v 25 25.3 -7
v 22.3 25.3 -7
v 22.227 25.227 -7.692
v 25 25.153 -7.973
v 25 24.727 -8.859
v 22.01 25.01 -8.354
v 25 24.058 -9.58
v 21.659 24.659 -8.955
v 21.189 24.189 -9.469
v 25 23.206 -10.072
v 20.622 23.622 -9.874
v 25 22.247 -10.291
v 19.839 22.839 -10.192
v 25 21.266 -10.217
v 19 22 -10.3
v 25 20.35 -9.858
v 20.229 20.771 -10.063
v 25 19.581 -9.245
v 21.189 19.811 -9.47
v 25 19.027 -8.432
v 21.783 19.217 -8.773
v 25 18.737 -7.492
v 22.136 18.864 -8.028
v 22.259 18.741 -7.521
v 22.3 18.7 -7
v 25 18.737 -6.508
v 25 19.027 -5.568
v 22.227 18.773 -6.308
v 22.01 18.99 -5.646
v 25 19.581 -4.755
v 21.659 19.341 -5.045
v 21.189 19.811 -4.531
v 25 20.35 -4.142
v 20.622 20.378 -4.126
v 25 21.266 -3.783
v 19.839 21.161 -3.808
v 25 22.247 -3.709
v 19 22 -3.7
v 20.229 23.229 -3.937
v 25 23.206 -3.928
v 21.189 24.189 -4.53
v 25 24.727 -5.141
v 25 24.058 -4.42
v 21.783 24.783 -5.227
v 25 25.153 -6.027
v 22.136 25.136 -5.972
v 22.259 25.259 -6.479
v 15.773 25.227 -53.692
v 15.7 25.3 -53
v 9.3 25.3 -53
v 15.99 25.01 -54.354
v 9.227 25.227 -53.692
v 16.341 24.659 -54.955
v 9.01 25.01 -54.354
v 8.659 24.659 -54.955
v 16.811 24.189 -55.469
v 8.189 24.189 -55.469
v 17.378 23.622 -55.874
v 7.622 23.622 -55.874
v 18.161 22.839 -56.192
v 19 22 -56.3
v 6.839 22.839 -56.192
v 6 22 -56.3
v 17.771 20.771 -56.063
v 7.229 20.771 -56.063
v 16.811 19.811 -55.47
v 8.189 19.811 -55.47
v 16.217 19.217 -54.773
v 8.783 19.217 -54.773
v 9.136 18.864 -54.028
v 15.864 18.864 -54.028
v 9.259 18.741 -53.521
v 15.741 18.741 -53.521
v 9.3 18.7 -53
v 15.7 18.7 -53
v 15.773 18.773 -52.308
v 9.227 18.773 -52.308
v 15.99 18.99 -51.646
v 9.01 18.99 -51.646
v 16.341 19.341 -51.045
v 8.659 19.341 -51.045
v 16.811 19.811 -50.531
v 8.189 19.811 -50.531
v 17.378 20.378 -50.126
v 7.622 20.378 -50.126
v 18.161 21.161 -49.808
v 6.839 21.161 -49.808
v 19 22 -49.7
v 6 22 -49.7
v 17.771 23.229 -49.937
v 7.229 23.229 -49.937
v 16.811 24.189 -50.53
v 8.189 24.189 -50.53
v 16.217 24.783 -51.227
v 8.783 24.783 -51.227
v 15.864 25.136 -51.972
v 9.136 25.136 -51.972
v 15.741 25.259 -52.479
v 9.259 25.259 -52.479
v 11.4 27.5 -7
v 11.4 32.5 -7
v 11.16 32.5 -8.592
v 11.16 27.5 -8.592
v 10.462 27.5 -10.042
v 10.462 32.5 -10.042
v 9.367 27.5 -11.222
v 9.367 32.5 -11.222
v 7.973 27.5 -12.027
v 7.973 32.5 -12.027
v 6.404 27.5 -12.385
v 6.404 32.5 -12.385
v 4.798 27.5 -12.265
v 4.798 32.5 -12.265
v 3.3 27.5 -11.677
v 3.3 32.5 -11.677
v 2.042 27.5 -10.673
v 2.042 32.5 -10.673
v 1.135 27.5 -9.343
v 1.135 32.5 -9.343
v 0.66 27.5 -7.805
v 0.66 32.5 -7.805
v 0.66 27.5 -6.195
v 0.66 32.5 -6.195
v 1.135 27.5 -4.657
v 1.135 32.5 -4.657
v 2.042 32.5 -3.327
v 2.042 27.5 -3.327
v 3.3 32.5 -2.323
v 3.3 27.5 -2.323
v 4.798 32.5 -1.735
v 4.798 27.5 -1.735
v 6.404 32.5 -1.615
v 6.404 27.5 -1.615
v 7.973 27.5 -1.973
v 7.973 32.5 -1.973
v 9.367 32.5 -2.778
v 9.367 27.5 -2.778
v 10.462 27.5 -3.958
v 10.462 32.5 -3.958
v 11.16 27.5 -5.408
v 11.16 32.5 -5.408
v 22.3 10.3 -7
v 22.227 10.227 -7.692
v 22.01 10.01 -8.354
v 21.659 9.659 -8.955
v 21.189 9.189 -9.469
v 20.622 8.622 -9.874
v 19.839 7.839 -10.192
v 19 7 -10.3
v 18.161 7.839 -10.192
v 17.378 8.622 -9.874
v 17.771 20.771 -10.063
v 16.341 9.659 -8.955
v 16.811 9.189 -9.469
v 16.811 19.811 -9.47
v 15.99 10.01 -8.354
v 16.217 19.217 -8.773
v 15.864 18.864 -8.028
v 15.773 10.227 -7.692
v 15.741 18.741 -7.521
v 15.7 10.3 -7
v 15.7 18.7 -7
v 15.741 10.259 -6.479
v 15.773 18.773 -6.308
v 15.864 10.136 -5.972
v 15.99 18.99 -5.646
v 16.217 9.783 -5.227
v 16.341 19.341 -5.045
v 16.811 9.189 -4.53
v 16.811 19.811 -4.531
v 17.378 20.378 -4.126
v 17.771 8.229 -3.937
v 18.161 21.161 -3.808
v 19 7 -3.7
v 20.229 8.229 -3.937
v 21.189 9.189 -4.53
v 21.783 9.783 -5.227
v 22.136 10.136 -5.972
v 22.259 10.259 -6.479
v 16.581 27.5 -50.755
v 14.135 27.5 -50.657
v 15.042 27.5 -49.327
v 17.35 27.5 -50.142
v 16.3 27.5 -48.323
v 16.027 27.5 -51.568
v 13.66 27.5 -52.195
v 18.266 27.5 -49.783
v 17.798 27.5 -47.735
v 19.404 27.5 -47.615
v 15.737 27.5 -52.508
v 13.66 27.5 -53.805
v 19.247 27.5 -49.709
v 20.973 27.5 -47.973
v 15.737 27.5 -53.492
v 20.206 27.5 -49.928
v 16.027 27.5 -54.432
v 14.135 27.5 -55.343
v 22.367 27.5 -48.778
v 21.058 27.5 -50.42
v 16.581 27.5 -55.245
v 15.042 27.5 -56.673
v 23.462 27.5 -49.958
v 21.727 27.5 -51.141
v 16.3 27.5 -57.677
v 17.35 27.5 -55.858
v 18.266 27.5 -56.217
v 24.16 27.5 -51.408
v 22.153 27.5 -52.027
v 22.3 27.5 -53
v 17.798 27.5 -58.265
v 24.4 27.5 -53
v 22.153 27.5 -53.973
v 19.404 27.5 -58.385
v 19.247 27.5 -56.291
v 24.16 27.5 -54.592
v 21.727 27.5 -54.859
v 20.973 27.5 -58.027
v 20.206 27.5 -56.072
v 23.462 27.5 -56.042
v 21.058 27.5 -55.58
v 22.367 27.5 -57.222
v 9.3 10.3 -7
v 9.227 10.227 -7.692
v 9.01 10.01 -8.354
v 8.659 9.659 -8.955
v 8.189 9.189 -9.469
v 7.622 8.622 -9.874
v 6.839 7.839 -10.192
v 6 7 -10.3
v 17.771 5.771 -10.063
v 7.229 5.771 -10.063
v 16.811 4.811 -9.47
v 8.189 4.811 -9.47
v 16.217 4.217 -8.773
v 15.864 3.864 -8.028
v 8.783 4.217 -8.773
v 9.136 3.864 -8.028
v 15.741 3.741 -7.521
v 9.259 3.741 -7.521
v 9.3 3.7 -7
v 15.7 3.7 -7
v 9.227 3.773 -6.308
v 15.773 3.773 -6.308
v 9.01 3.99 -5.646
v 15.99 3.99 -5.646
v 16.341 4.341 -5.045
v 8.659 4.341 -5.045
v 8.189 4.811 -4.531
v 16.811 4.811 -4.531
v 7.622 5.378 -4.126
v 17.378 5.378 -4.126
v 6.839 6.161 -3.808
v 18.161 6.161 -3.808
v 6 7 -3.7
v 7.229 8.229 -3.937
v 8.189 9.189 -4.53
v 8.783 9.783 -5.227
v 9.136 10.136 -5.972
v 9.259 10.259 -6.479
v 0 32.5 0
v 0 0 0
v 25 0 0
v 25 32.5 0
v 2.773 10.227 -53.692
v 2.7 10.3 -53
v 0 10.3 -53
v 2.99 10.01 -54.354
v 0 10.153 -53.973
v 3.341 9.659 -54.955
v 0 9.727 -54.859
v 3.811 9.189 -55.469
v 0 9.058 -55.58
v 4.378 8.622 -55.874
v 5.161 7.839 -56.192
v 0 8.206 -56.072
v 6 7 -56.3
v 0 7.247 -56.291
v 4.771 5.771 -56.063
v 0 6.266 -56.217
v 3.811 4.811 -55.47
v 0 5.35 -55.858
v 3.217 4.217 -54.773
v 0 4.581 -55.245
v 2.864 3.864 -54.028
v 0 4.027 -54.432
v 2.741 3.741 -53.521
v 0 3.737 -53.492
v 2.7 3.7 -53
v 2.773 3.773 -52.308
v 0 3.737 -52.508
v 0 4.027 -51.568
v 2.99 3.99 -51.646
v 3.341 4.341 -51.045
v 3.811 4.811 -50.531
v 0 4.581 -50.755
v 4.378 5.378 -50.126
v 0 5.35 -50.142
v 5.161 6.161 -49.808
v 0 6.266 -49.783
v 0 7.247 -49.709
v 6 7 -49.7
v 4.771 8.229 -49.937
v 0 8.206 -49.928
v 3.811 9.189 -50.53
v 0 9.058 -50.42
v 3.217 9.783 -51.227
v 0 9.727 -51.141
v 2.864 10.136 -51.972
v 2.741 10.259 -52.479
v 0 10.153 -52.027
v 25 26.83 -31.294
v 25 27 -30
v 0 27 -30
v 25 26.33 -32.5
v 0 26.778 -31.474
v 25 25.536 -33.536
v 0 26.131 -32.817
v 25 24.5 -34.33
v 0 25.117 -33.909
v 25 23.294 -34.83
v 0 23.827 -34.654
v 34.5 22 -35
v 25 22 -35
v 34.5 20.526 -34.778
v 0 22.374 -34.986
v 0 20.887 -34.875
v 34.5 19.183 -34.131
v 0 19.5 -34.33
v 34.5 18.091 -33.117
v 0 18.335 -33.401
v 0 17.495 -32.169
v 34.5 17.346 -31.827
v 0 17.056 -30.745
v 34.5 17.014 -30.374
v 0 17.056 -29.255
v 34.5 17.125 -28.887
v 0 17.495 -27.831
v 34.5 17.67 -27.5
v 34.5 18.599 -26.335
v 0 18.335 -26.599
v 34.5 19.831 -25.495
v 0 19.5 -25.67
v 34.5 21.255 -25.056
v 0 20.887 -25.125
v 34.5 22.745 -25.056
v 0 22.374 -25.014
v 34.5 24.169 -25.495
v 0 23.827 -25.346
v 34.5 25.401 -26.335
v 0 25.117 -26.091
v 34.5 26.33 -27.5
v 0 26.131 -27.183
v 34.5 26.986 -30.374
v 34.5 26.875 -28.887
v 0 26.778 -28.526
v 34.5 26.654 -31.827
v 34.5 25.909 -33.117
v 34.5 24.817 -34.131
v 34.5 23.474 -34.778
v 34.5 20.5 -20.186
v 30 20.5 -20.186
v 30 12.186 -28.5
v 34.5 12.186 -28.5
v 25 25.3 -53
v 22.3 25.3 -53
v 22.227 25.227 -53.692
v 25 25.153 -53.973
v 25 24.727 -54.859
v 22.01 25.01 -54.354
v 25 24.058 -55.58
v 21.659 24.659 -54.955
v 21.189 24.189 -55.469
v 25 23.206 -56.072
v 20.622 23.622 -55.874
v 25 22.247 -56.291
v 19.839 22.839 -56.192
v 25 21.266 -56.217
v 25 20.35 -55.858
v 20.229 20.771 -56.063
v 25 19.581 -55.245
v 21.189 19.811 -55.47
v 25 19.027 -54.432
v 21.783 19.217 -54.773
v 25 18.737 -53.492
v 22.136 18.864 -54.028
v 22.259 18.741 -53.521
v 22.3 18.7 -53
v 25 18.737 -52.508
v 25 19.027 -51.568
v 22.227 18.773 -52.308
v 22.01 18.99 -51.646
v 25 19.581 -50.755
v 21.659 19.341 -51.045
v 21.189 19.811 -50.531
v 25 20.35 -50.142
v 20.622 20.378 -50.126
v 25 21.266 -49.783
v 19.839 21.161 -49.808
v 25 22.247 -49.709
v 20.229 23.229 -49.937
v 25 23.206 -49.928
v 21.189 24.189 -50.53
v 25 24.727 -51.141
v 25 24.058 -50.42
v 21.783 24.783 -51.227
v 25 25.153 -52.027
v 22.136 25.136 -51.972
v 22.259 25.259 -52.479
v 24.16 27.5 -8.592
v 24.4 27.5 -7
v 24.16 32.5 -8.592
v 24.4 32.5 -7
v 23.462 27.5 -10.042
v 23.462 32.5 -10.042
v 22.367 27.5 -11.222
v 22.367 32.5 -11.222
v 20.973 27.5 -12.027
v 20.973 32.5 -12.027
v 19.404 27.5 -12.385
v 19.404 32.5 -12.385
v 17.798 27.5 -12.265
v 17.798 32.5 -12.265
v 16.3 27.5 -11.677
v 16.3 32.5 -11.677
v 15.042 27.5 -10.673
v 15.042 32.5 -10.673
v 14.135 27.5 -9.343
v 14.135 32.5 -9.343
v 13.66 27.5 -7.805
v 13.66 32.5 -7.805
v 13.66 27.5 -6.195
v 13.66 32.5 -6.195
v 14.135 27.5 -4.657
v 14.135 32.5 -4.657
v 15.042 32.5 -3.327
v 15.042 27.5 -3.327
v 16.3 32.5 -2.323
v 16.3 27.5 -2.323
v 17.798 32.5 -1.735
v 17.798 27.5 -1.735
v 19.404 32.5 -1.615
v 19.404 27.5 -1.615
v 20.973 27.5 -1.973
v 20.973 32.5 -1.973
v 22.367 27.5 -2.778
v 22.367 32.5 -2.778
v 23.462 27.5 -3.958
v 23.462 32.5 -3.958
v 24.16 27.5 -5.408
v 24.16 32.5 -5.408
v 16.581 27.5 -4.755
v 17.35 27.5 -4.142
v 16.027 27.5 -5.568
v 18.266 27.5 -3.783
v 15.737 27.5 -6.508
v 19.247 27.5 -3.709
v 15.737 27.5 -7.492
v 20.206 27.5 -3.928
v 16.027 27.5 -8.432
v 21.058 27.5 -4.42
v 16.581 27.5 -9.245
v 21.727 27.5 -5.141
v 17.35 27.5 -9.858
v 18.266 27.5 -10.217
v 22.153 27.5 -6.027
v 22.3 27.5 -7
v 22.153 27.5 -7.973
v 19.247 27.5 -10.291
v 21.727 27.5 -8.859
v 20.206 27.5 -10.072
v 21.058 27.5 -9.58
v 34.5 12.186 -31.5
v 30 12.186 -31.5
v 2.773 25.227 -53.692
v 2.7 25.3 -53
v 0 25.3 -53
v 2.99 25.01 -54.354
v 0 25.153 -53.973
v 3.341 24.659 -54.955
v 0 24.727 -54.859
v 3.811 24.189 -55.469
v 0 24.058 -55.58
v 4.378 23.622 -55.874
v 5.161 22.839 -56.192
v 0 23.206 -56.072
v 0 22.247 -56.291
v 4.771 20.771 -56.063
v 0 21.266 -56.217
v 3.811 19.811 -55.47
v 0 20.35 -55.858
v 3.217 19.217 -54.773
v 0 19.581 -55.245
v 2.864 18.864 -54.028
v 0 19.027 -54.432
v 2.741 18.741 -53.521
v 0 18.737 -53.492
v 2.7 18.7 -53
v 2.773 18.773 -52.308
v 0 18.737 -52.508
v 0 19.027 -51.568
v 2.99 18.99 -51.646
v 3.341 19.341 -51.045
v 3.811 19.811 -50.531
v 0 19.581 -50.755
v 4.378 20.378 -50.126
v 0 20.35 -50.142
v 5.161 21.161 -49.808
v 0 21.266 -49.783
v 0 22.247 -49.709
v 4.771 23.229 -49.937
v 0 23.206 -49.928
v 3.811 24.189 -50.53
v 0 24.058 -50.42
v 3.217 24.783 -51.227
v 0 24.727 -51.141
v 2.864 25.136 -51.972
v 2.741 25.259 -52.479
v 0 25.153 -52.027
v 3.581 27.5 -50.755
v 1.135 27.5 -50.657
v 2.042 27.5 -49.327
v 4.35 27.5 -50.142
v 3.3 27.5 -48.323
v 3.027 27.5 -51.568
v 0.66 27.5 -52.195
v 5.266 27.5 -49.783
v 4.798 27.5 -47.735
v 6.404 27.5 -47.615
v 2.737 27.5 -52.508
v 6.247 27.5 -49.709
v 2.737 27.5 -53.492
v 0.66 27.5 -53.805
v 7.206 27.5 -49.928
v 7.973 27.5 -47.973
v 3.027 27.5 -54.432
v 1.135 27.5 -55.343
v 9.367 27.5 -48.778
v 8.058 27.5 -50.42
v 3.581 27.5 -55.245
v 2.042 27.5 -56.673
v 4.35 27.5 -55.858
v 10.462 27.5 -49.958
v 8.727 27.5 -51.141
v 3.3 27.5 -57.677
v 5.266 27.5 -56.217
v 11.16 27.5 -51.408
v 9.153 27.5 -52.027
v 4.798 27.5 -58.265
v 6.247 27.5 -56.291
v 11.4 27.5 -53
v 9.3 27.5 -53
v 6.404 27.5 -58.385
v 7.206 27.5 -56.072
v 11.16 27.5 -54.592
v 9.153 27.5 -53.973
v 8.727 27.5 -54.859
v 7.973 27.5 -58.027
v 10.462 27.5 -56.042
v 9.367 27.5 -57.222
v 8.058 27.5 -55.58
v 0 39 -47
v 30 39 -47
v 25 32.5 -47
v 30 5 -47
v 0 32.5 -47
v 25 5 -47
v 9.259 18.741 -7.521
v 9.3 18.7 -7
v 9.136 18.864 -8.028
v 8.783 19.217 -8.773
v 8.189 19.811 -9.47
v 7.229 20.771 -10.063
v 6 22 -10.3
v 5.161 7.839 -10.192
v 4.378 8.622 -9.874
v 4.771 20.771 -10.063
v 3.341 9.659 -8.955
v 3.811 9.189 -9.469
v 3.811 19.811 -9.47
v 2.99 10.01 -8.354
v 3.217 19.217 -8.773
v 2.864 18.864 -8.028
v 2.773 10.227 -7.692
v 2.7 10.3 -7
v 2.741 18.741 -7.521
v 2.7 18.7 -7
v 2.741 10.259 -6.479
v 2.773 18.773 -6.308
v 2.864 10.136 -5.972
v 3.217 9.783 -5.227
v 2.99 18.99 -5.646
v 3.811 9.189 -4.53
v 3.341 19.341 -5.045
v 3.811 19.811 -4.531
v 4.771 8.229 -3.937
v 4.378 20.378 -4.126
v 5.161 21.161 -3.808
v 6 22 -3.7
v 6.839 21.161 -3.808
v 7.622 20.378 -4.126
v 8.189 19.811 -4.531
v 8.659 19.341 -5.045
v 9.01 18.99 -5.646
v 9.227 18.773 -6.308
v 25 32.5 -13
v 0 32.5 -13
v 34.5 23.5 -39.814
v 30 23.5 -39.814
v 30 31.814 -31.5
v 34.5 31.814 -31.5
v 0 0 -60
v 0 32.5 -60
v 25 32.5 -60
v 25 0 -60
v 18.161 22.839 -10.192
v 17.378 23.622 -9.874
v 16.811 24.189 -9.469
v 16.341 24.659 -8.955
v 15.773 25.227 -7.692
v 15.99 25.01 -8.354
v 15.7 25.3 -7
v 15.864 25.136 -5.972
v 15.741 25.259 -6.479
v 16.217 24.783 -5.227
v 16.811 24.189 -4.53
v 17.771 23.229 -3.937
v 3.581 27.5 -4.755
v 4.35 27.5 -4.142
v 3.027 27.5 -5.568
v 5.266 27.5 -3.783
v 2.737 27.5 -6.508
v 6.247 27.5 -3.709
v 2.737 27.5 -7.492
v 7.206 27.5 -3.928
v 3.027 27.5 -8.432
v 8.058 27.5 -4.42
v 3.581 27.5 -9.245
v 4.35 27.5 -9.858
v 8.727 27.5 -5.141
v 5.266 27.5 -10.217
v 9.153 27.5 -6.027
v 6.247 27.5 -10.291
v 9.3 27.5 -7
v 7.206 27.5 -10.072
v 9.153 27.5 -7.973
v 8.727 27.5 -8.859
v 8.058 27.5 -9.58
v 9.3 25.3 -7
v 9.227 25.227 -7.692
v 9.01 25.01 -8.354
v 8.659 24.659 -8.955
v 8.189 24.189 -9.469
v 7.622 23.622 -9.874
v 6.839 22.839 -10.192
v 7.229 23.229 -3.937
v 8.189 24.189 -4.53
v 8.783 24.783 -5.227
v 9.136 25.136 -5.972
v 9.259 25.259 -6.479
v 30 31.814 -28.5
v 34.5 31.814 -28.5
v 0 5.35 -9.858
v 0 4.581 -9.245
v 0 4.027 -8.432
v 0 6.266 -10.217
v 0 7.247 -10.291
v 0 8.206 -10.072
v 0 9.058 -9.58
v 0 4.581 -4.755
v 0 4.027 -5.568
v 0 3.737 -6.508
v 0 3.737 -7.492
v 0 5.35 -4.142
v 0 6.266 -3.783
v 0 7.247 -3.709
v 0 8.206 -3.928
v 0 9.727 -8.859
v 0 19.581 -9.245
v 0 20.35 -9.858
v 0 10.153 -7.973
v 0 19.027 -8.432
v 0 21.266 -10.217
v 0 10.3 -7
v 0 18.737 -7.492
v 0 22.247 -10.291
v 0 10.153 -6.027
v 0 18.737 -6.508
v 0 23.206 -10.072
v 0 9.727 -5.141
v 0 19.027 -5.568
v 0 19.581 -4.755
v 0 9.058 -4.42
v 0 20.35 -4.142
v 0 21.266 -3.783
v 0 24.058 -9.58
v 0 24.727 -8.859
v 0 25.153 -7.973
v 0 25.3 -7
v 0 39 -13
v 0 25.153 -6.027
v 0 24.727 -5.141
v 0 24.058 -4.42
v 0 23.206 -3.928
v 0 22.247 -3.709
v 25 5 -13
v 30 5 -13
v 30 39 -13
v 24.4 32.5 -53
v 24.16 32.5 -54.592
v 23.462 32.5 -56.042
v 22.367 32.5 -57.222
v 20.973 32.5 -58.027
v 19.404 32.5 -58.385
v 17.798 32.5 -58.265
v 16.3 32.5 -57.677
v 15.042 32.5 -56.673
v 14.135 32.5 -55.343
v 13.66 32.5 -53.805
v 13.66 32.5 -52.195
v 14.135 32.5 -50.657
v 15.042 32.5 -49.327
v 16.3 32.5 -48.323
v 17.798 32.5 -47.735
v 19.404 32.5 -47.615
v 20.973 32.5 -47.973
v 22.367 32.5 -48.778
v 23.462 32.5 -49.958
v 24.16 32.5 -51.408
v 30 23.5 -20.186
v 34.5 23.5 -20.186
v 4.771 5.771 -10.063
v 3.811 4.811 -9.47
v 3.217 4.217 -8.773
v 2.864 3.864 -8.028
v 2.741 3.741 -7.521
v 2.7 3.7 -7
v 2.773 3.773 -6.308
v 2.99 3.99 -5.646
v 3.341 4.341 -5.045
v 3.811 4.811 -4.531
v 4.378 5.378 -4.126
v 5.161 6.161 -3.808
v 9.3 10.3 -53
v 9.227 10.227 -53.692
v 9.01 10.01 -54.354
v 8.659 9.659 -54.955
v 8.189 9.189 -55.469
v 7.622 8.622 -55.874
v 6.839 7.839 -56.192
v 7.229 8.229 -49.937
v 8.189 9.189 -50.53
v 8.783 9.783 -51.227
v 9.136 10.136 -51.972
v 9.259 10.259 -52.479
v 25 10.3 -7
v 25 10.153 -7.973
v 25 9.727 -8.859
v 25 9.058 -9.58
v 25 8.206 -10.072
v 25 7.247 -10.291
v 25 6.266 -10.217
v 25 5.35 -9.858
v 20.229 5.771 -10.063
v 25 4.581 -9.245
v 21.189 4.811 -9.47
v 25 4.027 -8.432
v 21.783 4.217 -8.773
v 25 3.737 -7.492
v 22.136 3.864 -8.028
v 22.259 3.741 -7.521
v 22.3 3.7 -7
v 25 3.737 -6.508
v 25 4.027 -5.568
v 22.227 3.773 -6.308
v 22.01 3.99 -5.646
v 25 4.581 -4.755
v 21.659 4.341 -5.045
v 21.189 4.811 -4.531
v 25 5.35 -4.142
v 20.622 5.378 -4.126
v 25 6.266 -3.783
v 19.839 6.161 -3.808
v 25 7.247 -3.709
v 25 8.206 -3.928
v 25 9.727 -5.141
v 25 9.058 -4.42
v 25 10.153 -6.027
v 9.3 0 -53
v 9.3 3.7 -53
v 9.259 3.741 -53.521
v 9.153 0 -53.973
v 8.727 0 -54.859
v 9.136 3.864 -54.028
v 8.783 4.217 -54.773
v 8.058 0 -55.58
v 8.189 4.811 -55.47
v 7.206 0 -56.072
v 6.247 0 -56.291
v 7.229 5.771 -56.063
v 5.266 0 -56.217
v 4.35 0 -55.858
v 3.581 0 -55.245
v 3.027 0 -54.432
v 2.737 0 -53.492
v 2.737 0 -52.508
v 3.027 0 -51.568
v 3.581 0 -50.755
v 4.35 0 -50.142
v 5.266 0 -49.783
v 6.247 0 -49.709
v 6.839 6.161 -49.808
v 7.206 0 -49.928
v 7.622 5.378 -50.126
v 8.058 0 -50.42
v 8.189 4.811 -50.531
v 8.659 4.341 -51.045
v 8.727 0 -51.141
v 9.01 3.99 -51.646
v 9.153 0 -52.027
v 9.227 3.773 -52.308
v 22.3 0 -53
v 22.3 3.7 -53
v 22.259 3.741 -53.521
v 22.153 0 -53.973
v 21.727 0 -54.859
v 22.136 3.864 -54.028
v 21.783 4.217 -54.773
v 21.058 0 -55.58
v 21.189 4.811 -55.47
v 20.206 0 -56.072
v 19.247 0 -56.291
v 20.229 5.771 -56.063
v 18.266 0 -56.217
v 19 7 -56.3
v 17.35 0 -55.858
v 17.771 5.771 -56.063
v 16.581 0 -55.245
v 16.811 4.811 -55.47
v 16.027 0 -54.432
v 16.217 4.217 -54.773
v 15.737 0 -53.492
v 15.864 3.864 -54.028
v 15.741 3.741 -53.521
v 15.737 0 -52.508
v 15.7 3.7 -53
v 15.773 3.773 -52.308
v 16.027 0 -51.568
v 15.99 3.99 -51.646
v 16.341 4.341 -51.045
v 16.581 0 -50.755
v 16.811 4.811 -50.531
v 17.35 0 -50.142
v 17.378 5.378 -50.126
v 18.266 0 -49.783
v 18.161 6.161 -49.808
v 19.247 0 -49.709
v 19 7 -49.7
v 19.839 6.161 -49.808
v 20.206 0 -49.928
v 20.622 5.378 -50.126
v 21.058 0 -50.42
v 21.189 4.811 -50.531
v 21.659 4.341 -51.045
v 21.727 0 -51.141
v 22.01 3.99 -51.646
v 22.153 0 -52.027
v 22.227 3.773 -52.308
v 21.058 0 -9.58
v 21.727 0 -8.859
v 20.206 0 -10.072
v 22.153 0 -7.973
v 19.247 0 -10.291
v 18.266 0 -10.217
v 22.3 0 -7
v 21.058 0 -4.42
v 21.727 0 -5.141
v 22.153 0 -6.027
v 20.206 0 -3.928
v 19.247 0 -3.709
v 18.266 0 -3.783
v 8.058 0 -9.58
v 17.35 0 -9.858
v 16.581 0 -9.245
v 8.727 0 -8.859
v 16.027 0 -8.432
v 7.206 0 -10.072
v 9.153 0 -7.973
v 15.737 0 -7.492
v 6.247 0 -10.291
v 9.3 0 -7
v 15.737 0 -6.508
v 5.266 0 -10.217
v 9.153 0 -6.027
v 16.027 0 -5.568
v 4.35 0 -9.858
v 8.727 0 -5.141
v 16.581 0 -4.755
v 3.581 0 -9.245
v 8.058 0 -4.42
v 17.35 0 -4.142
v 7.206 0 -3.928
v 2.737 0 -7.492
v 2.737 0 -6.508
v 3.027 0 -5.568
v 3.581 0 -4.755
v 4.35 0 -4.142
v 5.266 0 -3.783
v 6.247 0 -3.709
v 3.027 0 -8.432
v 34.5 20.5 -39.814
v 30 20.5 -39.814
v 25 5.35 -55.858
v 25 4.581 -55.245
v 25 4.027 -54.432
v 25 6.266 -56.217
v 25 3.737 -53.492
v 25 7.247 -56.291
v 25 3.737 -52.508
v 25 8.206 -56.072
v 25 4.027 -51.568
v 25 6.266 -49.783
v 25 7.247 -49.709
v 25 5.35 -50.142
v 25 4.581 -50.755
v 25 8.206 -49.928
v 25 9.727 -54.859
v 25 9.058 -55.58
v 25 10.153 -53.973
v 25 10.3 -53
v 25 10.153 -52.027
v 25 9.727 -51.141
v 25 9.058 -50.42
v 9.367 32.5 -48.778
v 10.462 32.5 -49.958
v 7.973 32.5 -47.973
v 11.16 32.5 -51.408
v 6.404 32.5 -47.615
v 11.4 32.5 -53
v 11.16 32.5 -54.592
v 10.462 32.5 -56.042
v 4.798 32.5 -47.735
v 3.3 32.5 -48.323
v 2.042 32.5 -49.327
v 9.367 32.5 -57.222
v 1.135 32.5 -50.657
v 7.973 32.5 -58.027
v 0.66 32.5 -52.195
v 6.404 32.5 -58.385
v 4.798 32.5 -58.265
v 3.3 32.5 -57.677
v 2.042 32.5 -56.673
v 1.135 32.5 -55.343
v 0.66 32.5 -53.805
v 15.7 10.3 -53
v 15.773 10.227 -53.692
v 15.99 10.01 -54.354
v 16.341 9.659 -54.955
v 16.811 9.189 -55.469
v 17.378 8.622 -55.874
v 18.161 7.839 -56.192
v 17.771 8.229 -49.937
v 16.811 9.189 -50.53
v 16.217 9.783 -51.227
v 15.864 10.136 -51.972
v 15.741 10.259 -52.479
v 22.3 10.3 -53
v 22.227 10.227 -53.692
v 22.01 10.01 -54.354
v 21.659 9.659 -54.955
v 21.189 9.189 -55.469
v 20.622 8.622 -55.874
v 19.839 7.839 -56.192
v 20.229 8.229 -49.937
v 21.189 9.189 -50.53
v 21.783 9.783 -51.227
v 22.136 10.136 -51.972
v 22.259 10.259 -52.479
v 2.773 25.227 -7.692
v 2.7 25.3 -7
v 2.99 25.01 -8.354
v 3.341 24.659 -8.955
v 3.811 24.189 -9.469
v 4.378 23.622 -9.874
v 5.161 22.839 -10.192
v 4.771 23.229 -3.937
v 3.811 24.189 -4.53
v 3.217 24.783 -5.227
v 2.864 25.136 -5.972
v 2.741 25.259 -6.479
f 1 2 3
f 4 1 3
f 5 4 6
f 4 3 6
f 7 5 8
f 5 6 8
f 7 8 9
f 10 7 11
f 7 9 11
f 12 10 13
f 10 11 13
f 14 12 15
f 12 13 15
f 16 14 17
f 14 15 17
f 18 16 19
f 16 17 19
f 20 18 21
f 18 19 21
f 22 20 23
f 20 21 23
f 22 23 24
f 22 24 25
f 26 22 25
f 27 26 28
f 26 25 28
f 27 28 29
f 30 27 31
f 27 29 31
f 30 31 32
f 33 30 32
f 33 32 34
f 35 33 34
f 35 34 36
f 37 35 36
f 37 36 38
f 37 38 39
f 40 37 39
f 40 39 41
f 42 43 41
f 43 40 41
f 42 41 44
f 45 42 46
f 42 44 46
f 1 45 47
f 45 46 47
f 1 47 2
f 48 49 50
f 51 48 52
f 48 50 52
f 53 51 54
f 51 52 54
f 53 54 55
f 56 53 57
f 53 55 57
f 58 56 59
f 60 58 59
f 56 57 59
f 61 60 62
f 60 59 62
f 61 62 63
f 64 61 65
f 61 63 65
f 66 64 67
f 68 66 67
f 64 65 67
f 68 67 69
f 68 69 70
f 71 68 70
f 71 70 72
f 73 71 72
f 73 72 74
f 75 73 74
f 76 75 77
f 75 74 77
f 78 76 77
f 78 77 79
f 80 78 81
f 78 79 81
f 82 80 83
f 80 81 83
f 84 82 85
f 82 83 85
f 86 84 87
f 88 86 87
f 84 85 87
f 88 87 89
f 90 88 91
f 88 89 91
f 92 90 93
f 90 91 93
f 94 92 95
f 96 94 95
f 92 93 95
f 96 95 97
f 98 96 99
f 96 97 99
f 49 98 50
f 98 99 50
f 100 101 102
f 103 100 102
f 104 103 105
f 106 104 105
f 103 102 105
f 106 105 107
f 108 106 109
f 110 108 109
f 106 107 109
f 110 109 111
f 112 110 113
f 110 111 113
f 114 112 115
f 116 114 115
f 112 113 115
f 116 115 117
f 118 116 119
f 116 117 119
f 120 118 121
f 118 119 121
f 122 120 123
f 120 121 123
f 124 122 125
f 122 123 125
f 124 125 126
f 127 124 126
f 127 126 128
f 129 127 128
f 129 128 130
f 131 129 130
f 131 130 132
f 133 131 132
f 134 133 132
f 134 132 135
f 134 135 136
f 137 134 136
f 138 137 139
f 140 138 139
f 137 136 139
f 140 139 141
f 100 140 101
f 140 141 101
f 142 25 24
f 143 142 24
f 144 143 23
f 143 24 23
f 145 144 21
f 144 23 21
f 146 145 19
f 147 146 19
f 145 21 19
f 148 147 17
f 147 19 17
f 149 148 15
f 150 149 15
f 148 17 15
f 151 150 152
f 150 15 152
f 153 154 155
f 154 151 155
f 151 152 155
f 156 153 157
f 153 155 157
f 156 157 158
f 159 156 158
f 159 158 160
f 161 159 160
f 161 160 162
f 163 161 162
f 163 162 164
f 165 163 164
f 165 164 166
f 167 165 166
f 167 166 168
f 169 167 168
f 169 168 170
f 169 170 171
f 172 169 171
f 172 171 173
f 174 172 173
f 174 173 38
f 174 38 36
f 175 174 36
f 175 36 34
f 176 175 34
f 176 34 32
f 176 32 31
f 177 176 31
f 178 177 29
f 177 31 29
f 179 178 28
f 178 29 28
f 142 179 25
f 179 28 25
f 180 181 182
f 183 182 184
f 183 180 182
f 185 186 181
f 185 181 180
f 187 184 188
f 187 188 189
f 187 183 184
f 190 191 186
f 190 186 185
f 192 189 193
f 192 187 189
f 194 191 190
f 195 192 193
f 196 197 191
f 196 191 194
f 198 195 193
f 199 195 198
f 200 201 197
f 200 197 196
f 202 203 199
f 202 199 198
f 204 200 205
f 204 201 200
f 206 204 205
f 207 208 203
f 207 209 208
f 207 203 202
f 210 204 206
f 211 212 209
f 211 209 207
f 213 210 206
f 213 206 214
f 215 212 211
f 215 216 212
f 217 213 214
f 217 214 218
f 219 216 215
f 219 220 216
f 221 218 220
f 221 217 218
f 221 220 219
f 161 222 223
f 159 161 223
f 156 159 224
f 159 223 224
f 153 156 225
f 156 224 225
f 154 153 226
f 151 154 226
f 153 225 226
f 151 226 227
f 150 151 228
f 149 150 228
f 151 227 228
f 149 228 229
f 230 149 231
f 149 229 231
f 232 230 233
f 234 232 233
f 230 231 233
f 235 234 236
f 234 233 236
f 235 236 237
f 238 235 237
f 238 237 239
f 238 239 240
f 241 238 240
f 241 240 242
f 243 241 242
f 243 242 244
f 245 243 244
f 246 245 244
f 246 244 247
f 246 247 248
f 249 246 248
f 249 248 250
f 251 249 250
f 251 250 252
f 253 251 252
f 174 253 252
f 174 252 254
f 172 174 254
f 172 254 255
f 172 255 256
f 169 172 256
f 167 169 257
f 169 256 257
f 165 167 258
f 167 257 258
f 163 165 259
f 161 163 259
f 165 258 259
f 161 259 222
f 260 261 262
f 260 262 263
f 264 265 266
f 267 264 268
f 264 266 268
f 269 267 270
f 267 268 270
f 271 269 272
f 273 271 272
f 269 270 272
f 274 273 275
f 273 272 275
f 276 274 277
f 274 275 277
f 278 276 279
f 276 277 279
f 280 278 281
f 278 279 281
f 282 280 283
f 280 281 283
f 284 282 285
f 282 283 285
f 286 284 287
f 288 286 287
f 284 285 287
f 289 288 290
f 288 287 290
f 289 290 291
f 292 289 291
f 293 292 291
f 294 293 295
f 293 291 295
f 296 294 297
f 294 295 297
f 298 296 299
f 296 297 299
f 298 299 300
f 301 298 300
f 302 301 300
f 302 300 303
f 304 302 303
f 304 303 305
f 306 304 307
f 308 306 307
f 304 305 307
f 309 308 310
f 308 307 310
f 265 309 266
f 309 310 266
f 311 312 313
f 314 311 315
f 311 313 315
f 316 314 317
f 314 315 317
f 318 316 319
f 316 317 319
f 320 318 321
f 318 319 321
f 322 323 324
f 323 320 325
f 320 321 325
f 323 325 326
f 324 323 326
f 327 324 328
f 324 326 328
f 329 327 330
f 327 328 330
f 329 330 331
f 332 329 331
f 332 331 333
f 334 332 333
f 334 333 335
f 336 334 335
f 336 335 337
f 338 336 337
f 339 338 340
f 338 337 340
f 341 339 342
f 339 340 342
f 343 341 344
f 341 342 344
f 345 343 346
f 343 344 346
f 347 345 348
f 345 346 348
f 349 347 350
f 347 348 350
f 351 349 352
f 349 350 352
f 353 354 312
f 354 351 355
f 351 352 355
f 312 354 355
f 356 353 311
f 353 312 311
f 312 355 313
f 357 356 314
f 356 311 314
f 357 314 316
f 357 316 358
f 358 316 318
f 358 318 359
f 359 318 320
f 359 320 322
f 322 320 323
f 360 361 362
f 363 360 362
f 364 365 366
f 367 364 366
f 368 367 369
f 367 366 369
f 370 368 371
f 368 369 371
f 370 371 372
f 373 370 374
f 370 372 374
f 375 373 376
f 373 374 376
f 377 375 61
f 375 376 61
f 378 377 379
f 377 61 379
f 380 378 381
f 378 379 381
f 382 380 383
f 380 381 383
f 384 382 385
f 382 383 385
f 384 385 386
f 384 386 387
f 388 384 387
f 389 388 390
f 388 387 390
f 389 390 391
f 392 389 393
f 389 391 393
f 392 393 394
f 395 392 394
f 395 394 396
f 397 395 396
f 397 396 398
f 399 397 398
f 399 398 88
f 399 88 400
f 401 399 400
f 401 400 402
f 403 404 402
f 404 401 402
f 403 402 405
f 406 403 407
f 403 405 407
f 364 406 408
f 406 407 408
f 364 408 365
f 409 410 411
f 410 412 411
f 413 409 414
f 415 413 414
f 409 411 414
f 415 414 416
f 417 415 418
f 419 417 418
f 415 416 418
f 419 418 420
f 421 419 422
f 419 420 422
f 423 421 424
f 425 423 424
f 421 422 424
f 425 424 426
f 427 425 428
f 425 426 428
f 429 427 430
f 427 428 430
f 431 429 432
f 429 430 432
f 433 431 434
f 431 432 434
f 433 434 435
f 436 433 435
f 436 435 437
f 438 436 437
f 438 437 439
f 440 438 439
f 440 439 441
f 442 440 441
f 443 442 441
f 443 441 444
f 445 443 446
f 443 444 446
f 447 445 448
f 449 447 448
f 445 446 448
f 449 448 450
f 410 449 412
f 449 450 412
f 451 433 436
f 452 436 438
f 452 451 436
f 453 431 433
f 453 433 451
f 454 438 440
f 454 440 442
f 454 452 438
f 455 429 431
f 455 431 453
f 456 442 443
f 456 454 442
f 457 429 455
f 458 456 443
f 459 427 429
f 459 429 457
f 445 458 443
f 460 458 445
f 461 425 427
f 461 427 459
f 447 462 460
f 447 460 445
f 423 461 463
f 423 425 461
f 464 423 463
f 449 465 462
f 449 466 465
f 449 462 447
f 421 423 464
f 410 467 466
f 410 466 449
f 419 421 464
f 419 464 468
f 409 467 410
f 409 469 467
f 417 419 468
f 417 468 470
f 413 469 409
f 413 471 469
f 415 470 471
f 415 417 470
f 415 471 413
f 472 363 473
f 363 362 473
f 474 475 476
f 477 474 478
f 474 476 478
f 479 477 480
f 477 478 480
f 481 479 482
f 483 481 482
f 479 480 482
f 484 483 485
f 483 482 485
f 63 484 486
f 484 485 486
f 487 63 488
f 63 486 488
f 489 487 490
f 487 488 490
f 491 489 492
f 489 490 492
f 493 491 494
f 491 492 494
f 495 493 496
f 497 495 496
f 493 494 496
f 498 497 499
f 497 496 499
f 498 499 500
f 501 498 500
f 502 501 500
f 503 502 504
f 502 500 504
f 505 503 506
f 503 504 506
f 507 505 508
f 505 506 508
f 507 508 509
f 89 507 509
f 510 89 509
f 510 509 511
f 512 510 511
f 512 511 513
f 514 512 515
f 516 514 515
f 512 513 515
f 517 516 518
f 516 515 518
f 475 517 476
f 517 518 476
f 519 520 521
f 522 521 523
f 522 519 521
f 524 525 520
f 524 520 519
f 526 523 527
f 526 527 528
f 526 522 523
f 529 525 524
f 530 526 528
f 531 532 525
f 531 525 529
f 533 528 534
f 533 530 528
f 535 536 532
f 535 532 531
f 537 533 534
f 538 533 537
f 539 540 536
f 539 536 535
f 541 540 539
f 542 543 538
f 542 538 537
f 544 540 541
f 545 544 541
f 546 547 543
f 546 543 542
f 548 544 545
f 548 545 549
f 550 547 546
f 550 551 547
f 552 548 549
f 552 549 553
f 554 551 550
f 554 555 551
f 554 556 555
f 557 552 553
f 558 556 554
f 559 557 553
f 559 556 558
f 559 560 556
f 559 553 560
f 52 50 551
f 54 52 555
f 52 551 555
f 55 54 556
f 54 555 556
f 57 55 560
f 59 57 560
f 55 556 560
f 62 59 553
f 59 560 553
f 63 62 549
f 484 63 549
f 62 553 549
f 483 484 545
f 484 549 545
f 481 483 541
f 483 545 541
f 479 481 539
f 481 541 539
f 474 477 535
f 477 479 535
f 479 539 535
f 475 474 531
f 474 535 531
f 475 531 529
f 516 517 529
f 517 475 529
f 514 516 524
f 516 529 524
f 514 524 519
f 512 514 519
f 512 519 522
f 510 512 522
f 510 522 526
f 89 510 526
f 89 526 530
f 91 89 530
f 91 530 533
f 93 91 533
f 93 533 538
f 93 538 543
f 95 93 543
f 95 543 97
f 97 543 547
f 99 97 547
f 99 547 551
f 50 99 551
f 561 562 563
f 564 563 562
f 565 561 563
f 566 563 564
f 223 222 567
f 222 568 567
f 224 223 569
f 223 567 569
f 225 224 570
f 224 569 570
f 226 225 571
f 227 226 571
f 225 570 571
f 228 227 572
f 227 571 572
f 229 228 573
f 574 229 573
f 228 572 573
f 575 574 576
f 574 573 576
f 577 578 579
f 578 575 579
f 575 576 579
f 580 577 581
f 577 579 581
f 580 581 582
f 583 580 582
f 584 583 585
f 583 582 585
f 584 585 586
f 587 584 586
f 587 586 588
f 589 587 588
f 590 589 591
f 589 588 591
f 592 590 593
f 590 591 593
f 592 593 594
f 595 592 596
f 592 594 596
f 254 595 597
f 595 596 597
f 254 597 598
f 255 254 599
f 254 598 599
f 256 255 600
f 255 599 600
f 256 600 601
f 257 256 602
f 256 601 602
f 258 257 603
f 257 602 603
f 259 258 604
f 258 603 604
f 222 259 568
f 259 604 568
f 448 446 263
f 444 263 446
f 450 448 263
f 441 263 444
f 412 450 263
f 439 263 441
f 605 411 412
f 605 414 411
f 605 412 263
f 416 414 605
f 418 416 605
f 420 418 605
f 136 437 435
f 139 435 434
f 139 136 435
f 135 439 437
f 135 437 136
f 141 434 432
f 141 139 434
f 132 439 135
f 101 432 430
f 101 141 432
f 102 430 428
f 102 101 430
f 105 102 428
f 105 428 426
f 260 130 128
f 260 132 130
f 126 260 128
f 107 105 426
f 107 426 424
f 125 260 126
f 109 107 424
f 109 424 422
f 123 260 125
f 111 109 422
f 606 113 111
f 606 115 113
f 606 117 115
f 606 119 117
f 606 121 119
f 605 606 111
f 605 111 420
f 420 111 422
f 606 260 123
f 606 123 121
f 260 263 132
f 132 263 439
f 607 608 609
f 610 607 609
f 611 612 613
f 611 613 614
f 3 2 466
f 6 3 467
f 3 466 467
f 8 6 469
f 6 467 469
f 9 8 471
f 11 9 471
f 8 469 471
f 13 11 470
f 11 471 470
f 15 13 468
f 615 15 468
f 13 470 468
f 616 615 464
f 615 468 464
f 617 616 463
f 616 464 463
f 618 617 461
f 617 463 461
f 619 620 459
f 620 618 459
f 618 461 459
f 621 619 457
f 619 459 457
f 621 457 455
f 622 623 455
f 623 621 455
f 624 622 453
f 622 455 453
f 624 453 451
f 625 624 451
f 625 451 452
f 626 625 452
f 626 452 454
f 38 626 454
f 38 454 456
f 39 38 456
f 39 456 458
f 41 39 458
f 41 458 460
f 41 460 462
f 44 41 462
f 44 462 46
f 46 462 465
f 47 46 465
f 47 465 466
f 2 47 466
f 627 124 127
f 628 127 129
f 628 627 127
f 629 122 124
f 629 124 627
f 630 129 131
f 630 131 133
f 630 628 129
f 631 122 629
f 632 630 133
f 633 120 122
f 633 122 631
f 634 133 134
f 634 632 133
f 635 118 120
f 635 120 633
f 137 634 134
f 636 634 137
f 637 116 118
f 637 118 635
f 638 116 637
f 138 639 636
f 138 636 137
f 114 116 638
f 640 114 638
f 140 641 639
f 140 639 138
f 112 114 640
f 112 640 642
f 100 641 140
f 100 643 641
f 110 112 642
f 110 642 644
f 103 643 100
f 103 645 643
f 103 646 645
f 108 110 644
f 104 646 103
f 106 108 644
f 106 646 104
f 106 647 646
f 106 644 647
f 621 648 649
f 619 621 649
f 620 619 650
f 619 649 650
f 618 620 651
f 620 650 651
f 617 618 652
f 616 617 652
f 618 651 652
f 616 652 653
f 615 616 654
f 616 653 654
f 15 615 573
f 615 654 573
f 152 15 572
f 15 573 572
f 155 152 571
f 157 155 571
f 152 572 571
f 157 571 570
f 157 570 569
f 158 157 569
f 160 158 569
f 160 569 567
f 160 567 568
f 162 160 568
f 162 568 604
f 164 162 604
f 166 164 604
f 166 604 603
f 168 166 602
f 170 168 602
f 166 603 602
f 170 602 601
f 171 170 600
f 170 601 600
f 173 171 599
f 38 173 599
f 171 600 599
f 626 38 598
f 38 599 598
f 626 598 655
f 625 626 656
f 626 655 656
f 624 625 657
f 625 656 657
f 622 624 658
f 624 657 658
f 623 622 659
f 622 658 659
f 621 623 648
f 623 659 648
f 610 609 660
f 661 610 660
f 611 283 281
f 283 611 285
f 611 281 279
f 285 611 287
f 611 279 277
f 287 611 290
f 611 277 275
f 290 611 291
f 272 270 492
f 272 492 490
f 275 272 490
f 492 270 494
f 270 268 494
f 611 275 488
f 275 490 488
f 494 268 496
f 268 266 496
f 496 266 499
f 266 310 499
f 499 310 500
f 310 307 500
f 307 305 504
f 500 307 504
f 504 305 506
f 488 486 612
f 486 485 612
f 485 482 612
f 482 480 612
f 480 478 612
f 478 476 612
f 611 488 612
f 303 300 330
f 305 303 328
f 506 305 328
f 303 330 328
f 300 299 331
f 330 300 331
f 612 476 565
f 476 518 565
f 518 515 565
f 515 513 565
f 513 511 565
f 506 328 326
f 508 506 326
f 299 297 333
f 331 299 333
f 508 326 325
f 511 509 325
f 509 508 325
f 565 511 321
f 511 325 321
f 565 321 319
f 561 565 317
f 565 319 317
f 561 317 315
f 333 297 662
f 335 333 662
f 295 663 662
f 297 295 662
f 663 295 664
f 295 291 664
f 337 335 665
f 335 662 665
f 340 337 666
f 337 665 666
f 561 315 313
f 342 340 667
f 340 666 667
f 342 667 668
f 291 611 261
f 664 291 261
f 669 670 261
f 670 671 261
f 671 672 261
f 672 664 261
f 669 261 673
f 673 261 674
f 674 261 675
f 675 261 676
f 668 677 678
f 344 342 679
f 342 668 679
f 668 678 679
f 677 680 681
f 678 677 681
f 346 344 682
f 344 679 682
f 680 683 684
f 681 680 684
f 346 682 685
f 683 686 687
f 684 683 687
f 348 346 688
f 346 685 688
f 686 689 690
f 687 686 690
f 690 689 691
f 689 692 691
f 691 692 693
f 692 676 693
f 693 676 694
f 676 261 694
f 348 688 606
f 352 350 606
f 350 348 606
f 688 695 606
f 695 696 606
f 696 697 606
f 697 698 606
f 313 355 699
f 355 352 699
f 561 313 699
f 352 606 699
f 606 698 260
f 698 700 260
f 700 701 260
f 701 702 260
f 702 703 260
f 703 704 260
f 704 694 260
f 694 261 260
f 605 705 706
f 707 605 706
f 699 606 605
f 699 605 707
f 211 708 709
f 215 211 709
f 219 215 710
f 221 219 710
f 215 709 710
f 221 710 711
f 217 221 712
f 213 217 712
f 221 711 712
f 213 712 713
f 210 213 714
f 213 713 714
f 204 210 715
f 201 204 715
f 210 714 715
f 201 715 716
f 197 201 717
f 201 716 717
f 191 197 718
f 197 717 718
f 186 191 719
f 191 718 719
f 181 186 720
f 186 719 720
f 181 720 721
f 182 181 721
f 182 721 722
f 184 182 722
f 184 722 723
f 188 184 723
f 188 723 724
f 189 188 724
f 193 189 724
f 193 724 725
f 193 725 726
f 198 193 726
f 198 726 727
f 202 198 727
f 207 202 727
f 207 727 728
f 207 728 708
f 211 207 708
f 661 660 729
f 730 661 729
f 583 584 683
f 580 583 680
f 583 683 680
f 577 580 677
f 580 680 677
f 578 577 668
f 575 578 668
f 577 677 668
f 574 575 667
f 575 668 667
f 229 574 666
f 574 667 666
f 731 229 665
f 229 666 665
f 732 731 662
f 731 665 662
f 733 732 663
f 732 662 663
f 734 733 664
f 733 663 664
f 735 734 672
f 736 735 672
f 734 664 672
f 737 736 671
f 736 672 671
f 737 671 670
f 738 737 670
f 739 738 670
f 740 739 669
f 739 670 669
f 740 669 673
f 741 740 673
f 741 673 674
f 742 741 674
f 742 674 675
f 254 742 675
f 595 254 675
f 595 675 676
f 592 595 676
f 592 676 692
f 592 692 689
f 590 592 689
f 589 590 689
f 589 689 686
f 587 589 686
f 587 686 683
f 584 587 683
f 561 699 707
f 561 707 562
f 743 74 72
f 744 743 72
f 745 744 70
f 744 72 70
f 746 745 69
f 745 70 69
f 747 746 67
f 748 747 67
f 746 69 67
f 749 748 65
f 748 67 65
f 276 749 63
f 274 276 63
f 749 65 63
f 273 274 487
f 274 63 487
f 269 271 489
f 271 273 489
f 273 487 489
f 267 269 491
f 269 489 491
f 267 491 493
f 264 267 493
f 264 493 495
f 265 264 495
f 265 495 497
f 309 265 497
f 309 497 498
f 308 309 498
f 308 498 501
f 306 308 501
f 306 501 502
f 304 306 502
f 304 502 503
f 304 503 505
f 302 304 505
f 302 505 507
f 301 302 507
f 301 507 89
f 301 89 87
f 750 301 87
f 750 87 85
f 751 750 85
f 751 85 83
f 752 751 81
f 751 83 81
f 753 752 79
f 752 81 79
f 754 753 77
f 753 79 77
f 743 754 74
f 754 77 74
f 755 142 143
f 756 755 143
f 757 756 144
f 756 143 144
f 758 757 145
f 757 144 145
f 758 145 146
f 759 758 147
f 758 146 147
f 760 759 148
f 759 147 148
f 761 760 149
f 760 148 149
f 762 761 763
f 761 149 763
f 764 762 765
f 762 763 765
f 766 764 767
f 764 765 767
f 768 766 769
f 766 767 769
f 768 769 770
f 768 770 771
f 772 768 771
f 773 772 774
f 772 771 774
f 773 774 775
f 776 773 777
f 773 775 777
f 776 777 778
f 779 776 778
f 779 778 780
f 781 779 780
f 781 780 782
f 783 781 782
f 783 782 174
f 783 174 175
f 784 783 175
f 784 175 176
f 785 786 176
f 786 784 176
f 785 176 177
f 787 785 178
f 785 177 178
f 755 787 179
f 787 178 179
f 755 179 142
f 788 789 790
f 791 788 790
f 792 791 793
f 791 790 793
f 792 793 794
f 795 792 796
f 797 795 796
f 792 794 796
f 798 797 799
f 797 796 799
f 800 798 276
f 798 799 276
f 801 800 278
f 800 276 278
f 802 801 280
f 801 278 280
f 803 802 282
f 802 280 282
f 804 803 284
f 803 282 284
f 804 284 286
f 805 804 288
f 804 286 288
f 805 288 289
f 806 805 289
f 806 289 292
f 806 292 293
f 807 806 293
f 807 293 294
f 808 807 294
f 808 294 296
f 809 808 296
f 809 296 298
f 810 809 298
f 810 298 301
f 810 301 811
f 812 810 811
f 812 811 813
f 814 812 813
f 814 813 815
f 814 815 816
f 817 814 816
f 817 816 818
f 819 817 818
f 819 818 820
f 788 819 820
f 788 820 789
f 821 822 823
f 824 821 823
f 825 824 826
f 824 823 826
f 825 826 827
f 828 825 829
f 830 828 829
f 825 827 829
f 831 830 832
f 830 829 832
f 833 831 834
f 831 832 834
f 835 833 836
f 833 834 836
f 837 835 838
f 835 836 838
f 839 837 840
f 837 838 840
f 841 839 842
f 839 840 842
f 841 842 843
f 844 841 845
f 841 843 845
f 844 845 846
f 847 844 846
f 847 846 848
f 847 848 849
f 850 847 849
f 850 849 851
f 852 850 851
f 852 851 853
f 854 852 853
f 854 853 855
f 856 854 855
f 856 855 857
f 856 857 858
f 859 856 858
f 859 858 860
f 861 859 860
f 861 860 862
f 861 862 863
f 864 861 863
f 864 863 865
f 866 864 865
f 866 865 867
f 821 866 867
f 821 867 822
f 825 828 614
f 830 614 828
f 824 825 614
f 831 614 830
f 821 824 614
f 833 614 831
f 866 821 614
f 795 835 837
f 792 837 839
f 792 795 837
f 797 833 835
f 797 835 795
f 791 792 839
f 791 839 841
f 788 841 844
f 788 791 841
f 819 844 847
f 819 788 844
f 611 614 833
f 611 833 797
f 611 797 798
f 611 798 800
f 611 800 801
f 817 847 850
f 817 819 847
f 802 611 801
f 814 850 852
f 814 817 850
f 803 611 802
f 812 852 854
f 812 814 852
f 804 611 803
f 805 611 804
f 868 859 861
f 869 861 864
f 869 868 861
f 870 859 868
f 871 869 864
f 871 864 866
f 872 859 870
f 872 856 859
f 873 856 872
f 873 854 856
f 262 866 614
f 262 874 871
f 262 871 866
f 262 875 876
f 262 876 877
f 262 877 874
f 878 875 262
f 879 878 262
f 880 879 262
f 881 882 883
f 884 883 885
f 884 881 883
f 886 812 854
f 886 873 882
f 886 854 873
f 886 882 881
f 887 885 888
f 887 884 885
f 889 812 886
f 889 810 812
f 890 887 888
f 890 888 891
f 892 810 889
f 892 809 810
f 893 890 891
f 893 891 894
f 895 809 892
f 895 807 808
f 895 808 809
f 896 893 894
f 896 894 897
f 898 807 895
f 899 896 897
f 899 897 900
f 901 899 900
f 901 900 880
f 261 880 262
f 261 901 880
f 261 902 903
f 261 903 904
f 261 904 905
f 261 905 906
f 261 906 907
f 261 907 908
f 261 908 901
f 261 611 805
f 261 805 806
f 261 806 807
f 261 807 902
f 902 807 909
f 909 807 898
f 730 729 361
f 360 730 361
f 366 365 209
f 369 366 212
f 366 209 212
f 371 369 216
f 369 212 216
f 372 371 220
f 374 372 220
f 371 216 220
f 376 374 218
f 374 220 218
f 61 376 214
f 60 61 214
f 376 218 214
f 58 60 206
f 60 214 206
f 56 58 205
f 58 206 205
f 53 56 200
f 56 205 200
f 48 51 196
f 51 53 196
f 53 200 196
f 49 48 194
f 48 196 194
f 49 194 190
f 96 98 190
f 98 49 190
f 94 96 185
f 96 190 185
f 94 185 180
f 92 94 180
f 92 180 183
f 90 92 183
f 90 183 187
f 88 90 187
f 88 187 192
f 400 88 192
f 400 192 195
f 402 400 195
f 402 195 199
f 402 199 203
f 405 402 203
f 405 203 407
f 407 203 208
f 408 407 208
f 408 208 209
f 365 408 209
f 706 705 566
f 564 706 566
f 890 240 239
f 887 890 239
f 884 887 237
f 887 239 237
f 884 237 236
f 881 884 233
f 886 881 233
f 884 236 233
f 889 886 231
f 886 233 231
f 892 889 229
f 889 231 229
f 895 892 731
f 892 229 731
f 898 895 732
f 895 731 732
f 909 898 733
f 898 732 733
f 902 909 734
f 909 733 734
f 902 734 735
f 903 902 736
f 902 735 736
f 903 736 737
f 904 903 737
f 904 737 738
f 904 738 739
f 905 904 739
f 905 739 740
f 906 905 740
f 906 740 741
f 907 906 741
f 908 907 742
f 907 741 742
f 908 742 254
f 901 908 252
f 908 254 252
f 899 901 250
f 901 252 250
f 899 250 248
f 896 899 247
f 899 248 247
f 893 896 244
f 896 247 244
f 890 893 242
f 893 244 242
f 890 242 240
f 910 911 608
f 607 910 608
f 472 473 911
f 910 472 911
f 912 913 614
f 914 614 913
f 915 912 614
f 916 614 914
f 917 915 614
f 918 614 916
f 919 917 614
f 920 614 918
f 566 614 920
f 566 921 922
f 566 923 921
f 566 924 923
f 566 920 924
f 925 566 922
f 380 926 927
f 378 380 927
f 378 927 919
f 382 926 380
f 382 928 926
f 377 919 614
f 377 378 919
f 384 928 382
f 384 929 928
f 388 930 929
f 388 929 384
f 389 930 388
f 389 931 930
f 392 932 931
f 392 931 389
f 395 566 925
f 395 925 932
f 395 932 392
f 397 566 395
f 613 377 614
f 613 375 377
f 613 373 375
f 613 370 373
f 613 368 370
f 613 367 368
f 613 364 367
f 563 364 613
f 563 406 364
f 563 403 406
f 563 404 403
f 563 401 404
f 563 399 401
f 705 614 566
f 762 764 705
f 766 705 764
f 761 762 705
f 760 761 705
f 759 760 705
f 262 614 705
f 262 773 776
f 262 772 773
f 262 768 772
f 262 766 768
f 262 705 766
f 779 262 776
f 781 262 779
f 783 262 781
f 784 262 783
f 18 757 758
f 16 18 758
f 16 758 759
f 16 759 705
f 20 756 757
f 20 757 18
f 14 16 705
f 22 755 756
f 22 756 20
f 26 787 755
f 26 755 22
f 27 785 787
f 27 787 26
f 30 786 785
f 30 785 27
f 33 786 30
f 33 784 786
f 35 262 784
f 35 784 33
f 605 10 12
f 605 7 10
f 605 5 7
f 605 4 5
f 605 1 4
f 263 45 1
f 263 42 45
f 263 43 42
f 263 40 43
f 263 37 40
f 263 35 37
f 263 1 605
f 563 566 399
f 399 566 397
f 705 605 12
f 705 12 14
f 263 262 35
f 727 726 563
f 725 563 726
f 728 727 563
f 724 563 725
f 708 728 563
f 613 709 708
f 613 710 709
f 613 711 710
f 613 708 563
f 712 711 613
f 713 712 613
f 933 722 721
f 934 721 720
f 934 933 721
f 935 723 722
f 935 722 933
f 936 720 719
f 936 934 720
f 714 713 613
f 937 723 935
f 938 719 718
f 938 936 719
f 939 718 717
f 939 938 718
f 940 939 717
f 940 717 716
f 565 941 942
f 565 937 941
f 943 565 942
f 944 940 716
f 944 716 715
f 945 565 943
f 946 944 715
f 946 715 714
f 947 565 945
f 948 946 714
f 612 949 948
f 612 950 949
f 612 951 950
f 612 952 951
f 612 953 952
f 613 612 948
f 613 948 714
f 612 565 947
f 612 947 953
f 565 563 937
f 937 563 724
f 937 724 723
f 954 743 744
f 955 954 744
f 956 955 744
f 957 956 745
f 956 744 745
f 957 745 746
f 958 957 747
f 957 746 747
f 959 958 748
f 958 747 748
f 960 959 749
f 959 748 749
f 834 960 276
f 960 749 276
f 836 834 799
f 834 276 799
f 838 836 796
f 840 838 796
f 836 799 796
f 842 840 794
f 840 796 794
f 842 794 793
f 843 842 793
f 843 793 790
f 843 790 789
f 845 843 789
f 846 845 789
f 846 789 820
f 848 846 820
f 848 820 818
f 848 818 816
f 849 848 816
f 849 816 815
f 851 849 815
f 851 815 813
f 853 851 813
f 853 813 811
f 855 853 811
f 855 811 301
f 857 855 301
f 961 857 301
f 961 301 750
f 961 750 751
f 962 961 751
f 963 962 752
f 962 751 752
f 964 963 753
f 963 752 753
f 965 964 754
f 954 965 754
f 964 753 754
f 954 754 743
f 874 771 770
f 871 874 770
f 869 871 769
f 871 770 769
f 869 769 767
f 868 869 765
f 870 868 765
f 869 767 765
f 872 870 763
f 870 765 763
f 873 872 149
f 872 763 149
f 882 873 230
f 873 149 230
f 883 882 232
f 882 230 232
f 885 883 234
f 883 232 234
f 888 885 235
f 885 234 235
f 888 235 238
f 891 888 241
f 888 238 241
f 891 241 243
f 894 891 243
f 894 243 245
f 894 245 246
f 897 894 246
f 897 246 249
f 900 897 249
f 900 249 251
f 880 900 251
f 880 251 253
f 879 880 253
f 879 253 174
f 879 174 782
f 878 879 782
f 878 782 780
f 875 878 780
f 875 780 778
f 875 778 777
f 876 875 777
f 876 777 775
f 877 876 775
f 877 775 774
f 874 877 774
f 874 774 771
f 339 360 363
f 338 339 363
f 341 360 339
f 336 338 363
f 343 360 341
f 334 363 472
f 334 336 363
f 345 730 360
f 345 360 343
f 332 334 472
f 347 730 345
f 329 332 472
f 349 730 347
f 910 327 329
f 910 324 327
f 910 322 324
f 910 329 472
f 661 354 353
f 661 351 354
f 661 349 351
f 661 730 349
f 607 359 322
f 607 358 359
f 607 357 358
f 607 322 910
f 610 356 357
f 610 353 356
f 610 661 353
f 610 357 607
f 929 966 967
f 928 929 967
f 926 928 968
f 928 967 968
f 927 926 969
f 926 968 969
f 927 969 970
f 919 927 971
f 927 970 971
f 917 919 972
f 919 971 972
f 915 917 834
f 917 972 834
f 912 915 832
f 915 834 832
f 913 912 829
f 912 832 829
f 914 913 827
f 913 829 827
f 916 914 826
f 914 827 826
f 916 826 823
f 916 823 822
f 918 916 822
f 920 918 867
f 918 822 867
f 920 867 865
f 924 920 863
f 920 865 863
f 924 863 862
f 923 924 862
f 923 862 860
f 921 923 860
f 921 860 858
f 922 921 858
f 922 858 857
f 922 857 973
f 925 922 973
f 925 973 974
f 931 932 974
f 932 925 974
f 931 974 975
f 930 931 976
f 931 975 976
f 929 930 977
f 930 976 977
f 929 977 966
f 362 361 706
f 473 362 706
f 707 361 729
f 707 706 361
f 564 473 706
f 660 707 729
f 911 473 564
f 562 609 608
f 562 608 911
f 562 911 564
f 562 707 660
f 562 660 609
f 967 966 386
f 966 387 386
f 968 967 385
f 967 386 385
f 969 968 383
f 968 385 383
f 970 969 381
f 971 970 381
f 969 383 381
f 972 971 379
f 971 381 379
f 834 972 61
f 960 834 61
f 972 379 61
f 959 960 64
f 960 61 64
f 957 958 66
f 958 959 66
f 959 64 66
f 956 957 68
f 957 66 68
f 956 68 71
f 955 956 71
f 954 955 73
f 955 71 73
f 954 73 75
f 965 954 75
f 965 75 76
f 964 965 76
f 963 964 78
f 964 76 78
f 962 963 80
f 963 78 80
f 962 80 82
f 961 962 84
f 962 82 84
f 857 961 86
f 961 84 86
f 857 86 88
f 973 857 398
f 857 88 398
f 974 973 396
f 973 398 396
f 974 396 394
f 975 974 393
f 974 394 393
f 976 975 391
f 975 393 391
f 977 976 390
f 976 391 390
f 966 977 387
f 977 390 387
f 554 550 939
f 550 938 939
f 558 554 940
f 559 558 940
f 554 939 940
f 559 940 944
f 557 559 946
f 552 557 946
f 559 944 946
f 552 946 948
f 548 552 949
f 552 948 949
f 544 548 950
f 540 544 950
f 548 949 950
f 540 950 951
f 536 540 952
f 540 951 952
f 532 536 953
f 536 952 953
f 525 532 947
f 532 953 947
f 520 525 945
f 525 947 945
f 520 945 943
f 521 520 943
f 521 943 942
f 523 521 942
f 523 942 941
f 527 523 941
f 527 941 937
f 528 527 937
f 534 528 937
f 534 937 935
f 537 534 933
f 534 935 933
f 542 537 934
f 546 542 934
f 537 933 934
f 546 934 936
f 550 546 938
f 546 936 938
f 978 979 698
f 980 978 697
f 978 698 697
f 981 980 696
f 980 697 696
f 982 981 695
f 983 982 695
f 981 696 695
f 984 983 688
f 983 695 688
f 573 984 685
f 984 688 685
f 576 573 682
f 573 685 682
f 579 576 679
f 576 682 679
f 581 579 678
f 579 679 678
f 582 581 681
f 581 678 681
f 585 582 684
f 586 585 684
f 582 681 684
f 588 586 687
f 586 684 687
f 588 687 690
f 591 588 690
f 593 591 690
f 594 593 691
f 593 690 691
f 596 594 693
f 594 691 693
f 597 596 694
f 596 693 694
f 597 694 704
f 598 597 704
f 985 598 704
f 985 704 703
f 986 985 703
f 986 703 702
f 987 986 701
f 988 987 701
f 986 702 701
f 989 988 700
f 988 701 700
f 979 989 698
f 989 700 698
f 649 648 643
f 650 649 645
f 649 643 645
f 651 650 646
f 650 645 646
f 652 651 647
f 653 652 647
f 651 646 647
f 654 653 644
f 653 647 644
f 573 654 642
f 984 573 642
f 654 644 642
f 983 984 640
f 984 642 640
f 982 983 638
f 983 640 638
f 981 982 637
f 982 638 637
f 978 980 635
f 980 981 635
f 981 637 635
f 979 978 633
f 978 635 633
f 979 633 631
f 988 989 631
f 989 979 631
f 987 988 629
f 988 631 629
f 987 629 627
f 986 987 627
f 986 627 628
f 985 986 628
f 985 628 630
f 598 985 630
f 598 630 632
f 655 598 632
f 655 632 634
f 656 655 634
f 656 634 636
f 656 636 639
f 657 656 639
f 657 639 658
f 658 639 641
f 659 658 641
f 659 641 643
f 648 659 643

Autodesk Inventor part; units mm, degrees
ref_plane "YZ Plane" through (0, 0, 0) normal (1, 0, 0) x (0, 1, 0)
ref_plane "XZ Plane" through (0, 0, 0) normal (0, 1, 0) x (-1, 0, 0)
ref_plane "XY Plane" through (0, 0, 0) normal (0, 0, 1) x (1, 0, 0)
sketch "Sketch1" plane through (0, 0, 0) normal (1, 0, 0) x (0, 1, 0)
  line L0 (0, 0) -> (32.5, 0)
  line L1 (32.5, 0) -> (32.5, -13)
  line L2 (32.5, -60) -> (0, -60)
  line L3 (0, -60) -> (0, 0)
  circle A0 centre (22, -53) radius 3.3
  circle A1 centre (22, -7) radius 3.3
  circle A2 centre (7, -7) radius 3.3
  circle A3 centre (7, -53) radius 3.3
  line L4 (22, -7) -> (7, -7) construction
  line L5 (7, -7) -> (7, -53) construction
  line L6 (7, -53) -> (22, -53) construction
  line L7 (22, -53) -> (22, -7) construction
  line L8 (32.5, -13) -> (39, -13)
  line L9 (39, -13) -> (39, -47)
  line L10 (39, -47) -> (32.5, -47)
  line L11 (32.5, -47) -> (32.5, -60)
  line L12 (32.5, -13) -> (32.5, -47) construction
  circle A4 centre (22, -30) radius 5
  point P0 (32.5, -30)
  dimension "d0" = 60
  dimension "d1" = 6.6
  dimension "d2" = 15
  dimension "d3" = 46
  dimension "d4" = 22
  dimension "d5" = 32.5
  dimension "d6" = 34
  dimension "d7" = 39
  dimension "d8" = 10
extrude "Extrusion1" add sketch "Sketch1" along normal blind 25
sketch "Sketch2" plane through (25, 0, 0) normal (1, 0, 0) x (0, 0, -1)
  line L0 (47, 39) -> (13, 39) projected
  line L1 (13, 39) -> (13, 5)
  line L2 (13, 5) -> (47, 5)
  line L3 (47, 5) -> (47, 39)
  circle A0 centre (30, 22) radius 5 projected
  point P0 (0, 0)
extrude "Extrusion2" add sketch "Sketch2" along normal blind 5
sketch "Sketch3" plane through (30, 0, 0) normal (1, 0, 0) x (0, 0, -1)
  circle A0 centre (30, 22) radius 5 projected
  circle A1 centre (30, 22) radius 5 projected
  line L0 (20.1863, 23.5) -> (20.1863, 20.5)
  line L1 (20.1863, 20.5) -> (28.5, 12.1863)
  line L2 (28.5, 12.1863) -> (31.5, 12.1863)
  line L3 (31.5, 12.1863) -> (39.8137, 20.5)
  line L4 (39.8137, 20.5) -> (39.8137, 23.5)
  line L5 (39.8137, 23.5) -> (31.5, 31.8137)
  line L6 (31.5, 31.8137) -> (28.5, 31.8137)
  line L7 (28.5, 31.8137) -> (20.1863, 23.5)
  point P0 (0, 0)
  point P1 (30, 12.1863)
  point P2 (20.1863, 22)
  point P3 (35.6569, 27.6569)
  point P4 (24.3431, 16.3431)
  dimension "d14" = 135
  dimension "d15" = 16
  dimension "d16" = 3
extrude "Extrusion3" add sketch "Sketch3" along normal blind 4.5
sketch "Sketch4" plane through (0, 32.5, -47) normal (0, 1, 0) x (1, 0, 0)
  circle A0 centre (6, -40) radius 5.4
  point P0 (0, -47)
  dimension "d19" = 10.8
  dimension "d20" = 6
  dimension "d21" = 7
extrude "Extrusion4" cut sketch "Sketch4" against normal blind 5
sketch "Sketch5" plane through (6, 27.5, -7) normal (0, 1, 0) x (1, 0, 0)
  circle A0 centre (0, 0) radius 3.3
  circle A1 centre (0, 0) radius 5.4 construction
  point P0 (-6, -7)
  dimension "d24" = 6.6
extrude "Extrusion5" cut sketch "Sketch5" against normal up to surface (27.5 mm away)
pattern_linear "Rectangular Pattern1" count 2 spacing 13 along (1, 0, 0) count 2 spacing -46 along (0, 0, 1) of "Extrusion5", "Extrusion4"
properties part number "BK10_Frame"
